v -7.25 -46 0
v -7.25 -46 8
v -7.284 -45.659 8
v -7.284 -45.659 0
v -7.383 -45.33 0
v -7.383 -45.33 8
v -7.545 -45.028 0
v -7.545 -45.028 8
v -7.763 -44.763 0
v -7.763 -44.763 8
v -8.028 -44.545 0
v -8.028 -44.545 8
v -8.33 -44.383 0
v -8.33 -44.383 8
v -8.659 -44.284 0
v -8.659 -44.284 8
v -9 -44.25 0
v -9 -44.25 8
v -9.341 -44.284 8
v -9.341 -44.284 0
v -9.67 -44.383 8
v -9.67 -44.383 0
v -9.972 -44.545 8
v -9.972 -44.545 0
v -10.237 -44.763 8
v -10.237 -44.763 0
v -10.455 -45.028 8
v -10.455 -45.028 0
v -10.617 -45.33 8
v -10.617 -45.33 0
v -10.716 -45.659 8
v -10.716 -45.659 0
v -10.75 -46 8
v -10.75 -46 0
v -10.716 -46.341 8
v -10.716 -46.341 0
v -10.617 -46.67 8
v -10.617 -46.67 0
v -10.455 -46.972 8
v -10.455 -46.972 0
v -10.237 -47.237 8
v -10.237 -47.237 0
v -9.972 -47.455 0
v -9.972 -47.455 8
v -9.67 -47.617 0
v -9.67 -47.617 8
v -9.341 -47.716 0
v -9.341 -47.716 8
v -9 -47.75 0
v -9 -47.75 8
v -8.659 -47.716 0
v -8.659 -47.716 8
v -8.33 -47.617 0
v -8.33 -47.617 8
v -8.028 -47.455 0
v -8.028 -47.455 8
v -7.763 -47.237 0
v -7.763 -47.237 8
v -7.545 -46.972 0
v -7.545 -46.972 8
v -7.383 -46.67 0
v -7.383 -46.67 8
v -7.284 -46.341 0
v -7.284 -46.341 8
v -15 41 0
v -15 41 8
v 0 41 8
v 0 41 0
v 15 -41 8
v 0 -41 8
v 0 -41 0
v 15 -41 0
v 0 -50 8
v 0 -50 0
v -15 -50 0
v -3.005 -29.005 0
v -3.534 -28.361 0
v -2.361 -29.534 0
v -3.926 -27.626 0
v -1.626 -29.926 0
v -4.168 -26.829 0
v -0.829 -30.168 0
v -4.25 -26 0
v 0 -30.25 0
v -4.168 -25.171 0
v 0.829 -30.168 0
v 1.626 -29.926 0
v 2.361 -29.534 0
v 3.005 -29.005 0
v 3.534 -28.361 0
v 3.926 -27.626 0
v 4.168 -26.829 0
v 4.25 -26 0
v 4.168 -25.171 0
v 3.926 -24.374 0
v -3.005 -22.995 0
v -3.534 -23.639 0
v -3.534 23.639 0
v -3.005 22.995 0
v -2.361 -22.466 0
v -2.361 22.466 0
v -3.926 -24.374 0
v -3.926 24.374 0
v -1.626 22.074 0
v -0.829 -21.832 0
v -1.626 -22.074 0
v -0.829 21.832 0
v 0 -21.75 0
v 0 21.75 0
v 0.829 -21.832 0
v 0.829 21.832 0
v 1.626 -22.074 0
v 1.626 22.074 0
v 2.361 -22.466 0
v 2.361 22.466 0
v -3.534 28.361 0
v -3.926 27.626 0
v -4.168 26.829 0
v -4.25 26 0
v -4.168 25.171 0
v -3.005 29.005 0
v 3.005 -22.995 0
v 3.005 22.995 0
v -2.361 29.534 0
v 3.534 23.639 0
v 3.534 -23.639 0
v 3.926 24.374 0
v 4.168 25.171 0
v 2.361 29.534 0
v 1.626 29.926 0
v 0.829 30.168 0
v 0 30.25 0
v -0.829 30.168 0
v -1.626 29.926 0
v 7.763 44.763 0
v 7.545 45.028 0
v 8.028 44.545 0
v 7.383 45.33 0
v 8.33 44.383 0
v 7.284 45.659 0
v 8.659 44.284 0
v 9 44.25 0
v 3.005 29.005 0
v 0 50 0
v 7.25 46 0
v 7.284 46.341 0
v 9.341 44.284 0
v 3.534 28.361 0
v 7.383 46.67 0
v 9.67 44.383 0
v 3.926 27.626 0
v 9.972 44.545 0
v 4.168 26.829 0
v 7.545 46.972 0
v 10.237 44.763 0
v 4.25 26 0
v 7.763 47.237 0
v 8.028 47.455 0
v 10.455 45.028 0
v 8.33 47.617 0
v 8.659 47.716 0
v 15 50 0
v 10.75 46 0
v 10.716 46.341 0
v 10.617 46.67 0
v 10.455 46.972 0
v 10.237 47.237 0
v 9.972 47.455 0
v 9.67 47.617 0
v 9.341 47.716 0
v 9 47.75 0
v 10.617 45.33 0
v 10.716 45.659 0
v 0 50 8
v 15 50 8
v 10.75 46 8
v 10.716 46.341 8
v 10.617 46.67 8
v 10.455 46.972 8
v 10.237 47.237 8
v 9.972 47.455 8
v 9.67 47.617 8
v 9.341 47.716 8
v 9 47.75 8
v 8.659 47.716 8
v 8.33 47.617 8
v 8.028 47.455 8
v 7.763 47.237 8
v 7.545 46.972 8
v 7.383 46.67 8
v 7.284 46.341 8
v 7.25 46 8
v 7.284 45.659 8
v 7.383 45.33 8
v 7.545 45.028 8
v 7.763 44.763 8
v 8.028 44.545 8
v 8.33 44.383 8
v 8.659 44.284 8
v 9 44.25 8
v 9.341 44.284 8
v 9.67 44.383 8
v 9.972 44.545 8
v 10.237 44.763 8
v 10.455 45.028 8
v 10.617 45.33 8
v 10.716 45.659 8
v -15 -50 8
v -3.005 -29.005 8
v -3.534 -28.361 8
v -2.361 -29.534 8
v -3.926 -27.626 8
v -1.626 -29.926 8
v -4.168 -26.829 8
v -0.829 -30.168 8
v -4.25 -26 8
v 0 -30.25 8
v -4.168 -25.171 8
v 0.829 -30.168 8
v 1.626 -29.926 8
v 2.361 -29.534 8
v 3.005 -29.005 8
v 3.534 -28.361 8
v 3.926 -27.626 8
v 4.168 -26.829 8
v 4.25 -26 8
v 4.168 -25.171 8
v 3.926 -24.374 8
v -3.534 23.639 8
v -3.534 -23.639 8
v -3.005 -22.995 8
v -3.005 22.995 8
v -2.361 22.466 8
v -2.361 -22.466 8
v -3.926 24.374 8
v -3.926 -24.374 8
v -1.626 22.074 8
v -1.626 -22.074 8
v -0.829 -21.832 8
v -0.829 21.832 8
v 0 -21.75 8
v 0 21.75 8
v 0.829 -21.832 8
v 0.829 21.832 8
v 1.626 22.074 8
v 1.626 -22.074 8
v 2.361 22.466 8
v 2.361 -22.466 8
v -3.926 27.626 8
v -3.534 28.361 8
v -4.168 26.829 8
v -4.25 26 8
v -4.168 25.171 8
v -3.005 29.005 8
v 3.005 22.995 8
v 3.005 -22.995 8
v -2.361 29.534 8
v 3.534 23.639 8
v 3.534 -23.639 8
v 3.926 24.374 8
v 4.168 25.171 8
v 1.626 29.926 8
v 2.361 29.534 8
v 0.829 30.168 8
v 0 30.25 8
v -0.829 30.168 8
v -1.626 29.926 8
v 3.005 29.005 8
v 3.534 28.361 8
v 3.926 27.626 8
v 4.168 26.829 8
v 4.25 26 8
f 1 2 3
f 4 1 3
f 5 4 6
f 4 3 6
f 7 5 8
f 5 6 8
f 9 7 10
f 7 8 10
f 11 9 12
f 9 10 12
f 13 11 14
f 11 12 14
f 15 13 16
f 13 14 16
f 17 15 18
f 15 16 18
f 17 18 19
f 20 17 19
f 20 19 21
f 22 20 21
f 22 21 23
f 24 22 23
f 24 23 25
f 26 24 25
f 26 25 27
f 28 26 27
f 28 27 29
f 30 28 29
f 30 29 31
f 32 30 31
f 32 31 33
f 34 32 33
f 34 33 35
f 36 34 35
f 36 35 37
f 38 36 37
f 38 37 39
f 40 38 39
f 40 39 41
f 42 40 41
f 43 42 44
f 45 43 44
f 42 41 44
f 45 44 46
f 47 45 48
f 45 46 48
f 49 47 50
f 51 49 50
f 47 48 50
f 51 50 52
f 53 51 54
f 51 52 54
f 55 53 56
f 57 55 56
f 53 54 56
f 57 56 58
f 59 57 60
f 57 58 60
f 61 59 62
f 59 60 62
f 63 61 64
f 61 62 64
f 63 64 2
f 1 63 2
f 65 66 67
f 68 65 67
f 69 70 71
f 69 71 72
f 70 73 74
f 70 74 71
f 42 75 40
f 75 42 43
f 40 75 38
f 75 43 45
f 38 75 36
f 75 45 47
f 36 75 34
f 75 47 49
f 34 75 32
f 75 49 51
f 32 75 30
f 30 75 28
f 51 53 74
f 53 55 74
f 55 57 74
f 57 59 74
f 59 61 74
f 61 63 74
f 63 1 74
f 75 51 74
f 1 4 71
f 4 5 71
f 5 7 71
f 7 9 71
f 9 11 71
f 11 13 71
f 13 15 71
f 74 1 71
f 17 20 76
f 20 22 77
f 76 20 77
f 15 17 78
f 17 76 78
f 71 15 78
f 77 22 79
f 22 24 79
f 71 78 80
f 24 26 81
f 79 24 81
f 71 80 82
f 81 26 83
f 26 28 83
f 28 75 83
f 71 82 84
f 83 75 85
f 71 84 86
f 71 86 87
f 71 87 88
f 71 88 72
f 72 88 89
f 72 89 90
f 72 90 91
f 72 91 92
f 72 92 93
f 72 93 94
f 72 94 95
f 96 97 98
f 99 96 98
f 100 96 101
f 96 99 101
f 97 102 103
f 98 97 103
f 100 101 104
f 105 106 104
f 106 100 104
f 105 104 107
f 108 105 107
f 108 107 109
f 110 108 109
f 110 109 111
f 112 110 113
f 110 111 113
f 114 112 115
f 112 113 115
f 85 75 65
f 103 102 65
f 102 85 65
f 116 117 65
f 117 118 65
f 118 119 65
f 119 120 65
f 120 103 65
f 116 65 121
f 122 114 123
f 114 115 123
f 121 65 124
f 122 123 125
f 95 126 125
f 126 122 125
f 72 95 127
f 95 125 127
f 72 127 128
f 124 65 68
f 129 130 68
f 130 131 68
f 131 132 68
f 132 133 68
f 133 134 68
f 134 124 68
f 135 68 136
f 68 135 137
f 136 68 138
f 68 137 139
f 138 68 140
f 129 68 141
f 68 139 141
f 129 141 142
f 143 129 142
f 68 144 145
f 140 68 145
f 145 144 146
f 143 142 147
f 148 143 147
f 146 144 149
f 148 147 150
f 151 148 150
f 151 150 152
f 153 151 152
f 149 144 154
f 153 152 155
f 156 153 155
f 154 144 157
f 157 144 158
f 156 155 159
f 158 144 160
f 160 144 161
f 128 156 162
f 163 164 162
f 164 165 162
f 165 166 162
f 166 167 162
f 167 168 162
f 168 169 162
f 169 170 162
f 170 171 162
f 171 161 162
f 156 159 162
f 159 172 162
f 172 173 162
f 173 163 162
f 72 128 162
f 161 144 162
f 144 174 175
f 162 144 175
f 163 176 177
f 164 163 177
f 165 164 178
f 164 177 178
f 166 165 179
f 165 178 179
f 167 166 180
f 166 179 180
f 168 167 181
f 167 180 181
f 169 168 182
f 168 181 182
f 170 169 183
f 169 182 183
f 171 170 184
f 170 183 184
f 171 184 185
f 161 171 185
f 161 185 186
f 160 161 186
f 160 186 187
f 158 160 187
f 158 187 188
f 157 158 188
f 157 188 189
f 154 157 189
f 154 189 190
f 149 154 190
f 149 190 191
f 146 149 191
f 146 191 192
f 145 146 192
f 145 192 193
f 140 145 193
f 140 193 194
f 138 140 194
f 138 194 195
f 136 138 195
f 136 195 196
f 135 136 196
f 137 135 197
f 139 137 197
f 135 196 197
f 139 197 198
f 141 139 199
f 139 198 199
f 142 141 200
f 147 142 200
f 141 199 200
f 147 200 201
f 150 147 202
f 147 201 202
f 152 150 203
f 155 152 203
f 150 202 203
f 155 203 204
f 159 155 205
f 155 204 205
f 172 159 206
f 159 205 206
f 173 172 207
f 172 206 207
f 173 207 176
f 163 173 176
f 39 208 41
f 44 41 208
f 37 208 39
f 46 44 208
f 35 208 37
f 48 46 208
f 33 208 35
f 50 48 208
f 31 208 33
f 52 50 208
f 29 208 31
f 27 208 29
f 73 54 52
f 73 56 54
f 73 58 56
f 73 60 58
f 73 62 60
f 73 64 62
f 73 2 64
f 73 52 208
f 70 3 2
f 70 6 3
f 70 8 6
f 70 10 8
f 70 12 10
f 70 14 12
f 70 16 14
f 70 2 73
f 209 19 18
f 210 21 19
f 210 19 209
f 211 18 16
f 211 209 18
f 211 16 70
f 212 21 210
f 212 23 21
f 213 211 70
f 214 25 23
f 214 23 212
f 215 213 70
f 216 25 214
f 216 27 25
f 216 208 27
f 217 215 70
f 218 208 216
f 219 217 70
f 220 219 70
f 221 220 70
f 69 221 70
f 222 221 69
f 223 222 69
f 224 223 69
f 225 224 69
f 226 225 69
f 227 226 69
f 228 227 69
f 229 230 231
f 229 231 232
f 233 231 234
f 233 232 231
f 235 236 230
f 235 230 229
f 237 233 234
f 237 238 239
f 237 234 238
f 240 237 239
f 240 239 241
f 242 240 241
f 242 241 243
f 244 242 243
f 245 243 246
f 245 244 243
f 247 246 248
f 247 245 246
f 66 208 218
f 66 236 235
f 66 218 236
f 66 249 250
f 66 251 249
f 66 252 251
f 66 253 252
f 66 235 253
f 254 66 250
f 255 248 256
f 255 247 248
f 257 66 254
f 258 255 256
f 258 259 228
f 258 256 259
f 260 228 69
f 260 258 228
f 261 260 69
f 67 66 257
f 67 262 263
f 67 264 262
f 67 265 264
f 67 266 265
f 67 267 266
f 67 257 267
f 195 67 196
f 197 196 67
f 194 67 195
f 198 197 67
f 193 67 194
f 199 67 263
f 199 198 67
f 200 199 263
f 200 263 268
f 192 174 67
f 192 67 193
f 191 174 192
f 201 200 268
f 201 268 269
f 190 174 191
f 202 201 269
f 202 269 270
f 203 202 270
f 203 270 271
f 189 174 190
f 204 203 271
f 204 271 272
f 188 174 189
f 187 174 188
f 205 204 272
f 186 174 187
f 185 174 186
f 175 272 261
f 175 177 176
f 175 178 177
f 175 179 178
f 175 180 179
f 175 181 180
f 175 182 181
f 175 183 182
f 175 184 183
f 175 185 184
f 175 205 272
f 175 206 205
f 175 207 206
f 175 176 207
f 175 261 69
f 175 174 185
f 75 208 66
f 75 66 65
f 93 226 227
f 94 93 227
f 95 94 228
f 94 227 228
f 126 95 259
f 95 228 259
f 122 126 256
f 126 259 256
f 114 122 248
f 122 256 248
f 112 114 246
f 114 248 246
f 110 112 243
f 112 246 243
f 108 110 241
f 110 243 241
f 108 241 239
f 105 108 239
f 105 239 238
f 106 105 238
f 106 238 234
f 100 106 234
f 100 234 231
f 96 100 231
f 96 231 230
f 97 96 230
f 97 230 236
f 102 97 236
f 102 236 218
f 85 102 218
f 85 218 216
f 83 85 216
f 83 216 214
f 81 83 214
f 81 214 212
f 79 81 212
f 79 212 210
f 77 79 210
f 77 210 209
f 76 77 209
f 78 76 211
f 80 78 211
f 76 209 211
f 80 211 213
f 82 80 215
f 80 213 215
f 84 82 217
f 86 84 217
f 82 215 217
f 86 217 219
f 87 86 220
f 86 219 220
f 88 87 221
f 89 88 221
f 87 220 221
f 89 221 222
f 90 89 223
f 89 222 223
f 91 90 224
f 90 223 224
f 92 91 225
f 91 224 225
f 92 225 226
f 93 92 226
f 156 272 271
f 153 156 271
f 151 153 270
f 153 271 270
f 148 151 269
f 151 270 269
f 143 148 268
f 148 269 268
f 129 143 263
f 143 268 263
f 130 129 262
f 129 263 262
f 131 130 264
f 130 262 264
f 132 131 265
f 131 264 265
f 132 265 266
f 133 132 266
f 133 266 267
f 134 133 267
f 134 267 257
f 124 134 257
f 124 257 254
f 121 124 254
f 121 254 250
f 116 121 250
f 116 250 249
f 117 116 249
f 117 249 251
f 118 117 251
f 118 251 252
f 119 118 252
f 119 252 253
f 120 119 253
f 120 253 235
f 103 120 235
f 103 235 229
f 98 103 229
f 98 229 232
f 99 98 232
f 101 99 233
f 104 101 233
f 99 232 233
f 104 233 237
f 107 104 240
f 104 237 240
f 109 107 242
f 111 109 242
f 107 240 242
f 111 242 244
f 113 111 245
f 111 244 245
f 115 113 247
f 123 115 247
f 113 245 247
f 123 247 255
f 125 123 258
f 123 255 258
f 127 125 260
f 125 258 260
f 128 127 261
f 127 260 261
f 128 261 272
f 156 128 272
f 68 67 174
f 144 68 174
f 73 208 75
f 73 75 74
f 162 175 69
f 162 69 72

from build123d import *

# Parameters (mm, degrees)
F0_W     = 42
F0_H     = 120
F1_DEPTH = 8
F2_W     = 42
F2_H     = 120
F2_W_2   = 30
F2_H_2   = 100
F3_DEPTH = 25
F4_W     = 15
F4_H     = 10
F5_DEPTH = 25
F6_DEPTH = 1
F7_DEPTH = 1
F8_R     = 1.75
F8_R_2   = 4.25
F9_DEPTH = 25


with BuildPart() as f1:
    # F0 (on Top) → F1 (new body)
    with BuildSketch(Plane.XY):
        Rectangle(F0_W, F0_H)
    extrude(amount=F1_DEPTH)

    # F2 (on face) → F3 (cut)
    with BuildSketch(Plane.XY.offset(8)):
        Rectangle(F2_W, F2_H)
        Rectangle(F2_W_2, F2_H_2, mode=Mode.SUBTRACT)
    extrude(amount=-F3_DEPTH, mode=Mode.SUBTRACT)

    # F4 (on face) → F5 (cut)
    with BuildSketch(Plane.XY.offset(8)):
        with Locations((-7.5, 45)):
            Rectangle(F4_W, F4_H)
        with Locations((7.5, -45)):
            Rectangle(F4_W, F4_H)
    extrude(amount=-F5_DEPTH, mode=Mode.SUBTRACT)

    # F6 (add): a face of the model
    f6_faces = [f1.faces().sort_by_distance(p)[0] for p in [
        (-7.5, 40, 4),
    ]]
    extrude(f6_faces, amount=F6_DEPTH)

    # F7 (add): a face of the model
    f7_faces = [f1.faces().sort_by_distance(p)[0] for p in [
        (7.5, -40, 4),
    ]]
    extrude(f7_faces, amount=F7_DEPTH)

    # F8 (on face) → F9 (cut)
    with BuildSketch(Plane.XY.offset(8)):
        with Locations((9, 46)):
            Circle(F8_R)
        with Locations((-9, -46)):
            Circle(F8_R)
        with Locations((0, 26)):
            Circle(F8_R_2)
        with Locations((0, -26)):
            Circle(F8_R_2)
    extrude(amount=-F9_DEPTH, mode=Mode.SUBTRACT)


solid = f1.part
